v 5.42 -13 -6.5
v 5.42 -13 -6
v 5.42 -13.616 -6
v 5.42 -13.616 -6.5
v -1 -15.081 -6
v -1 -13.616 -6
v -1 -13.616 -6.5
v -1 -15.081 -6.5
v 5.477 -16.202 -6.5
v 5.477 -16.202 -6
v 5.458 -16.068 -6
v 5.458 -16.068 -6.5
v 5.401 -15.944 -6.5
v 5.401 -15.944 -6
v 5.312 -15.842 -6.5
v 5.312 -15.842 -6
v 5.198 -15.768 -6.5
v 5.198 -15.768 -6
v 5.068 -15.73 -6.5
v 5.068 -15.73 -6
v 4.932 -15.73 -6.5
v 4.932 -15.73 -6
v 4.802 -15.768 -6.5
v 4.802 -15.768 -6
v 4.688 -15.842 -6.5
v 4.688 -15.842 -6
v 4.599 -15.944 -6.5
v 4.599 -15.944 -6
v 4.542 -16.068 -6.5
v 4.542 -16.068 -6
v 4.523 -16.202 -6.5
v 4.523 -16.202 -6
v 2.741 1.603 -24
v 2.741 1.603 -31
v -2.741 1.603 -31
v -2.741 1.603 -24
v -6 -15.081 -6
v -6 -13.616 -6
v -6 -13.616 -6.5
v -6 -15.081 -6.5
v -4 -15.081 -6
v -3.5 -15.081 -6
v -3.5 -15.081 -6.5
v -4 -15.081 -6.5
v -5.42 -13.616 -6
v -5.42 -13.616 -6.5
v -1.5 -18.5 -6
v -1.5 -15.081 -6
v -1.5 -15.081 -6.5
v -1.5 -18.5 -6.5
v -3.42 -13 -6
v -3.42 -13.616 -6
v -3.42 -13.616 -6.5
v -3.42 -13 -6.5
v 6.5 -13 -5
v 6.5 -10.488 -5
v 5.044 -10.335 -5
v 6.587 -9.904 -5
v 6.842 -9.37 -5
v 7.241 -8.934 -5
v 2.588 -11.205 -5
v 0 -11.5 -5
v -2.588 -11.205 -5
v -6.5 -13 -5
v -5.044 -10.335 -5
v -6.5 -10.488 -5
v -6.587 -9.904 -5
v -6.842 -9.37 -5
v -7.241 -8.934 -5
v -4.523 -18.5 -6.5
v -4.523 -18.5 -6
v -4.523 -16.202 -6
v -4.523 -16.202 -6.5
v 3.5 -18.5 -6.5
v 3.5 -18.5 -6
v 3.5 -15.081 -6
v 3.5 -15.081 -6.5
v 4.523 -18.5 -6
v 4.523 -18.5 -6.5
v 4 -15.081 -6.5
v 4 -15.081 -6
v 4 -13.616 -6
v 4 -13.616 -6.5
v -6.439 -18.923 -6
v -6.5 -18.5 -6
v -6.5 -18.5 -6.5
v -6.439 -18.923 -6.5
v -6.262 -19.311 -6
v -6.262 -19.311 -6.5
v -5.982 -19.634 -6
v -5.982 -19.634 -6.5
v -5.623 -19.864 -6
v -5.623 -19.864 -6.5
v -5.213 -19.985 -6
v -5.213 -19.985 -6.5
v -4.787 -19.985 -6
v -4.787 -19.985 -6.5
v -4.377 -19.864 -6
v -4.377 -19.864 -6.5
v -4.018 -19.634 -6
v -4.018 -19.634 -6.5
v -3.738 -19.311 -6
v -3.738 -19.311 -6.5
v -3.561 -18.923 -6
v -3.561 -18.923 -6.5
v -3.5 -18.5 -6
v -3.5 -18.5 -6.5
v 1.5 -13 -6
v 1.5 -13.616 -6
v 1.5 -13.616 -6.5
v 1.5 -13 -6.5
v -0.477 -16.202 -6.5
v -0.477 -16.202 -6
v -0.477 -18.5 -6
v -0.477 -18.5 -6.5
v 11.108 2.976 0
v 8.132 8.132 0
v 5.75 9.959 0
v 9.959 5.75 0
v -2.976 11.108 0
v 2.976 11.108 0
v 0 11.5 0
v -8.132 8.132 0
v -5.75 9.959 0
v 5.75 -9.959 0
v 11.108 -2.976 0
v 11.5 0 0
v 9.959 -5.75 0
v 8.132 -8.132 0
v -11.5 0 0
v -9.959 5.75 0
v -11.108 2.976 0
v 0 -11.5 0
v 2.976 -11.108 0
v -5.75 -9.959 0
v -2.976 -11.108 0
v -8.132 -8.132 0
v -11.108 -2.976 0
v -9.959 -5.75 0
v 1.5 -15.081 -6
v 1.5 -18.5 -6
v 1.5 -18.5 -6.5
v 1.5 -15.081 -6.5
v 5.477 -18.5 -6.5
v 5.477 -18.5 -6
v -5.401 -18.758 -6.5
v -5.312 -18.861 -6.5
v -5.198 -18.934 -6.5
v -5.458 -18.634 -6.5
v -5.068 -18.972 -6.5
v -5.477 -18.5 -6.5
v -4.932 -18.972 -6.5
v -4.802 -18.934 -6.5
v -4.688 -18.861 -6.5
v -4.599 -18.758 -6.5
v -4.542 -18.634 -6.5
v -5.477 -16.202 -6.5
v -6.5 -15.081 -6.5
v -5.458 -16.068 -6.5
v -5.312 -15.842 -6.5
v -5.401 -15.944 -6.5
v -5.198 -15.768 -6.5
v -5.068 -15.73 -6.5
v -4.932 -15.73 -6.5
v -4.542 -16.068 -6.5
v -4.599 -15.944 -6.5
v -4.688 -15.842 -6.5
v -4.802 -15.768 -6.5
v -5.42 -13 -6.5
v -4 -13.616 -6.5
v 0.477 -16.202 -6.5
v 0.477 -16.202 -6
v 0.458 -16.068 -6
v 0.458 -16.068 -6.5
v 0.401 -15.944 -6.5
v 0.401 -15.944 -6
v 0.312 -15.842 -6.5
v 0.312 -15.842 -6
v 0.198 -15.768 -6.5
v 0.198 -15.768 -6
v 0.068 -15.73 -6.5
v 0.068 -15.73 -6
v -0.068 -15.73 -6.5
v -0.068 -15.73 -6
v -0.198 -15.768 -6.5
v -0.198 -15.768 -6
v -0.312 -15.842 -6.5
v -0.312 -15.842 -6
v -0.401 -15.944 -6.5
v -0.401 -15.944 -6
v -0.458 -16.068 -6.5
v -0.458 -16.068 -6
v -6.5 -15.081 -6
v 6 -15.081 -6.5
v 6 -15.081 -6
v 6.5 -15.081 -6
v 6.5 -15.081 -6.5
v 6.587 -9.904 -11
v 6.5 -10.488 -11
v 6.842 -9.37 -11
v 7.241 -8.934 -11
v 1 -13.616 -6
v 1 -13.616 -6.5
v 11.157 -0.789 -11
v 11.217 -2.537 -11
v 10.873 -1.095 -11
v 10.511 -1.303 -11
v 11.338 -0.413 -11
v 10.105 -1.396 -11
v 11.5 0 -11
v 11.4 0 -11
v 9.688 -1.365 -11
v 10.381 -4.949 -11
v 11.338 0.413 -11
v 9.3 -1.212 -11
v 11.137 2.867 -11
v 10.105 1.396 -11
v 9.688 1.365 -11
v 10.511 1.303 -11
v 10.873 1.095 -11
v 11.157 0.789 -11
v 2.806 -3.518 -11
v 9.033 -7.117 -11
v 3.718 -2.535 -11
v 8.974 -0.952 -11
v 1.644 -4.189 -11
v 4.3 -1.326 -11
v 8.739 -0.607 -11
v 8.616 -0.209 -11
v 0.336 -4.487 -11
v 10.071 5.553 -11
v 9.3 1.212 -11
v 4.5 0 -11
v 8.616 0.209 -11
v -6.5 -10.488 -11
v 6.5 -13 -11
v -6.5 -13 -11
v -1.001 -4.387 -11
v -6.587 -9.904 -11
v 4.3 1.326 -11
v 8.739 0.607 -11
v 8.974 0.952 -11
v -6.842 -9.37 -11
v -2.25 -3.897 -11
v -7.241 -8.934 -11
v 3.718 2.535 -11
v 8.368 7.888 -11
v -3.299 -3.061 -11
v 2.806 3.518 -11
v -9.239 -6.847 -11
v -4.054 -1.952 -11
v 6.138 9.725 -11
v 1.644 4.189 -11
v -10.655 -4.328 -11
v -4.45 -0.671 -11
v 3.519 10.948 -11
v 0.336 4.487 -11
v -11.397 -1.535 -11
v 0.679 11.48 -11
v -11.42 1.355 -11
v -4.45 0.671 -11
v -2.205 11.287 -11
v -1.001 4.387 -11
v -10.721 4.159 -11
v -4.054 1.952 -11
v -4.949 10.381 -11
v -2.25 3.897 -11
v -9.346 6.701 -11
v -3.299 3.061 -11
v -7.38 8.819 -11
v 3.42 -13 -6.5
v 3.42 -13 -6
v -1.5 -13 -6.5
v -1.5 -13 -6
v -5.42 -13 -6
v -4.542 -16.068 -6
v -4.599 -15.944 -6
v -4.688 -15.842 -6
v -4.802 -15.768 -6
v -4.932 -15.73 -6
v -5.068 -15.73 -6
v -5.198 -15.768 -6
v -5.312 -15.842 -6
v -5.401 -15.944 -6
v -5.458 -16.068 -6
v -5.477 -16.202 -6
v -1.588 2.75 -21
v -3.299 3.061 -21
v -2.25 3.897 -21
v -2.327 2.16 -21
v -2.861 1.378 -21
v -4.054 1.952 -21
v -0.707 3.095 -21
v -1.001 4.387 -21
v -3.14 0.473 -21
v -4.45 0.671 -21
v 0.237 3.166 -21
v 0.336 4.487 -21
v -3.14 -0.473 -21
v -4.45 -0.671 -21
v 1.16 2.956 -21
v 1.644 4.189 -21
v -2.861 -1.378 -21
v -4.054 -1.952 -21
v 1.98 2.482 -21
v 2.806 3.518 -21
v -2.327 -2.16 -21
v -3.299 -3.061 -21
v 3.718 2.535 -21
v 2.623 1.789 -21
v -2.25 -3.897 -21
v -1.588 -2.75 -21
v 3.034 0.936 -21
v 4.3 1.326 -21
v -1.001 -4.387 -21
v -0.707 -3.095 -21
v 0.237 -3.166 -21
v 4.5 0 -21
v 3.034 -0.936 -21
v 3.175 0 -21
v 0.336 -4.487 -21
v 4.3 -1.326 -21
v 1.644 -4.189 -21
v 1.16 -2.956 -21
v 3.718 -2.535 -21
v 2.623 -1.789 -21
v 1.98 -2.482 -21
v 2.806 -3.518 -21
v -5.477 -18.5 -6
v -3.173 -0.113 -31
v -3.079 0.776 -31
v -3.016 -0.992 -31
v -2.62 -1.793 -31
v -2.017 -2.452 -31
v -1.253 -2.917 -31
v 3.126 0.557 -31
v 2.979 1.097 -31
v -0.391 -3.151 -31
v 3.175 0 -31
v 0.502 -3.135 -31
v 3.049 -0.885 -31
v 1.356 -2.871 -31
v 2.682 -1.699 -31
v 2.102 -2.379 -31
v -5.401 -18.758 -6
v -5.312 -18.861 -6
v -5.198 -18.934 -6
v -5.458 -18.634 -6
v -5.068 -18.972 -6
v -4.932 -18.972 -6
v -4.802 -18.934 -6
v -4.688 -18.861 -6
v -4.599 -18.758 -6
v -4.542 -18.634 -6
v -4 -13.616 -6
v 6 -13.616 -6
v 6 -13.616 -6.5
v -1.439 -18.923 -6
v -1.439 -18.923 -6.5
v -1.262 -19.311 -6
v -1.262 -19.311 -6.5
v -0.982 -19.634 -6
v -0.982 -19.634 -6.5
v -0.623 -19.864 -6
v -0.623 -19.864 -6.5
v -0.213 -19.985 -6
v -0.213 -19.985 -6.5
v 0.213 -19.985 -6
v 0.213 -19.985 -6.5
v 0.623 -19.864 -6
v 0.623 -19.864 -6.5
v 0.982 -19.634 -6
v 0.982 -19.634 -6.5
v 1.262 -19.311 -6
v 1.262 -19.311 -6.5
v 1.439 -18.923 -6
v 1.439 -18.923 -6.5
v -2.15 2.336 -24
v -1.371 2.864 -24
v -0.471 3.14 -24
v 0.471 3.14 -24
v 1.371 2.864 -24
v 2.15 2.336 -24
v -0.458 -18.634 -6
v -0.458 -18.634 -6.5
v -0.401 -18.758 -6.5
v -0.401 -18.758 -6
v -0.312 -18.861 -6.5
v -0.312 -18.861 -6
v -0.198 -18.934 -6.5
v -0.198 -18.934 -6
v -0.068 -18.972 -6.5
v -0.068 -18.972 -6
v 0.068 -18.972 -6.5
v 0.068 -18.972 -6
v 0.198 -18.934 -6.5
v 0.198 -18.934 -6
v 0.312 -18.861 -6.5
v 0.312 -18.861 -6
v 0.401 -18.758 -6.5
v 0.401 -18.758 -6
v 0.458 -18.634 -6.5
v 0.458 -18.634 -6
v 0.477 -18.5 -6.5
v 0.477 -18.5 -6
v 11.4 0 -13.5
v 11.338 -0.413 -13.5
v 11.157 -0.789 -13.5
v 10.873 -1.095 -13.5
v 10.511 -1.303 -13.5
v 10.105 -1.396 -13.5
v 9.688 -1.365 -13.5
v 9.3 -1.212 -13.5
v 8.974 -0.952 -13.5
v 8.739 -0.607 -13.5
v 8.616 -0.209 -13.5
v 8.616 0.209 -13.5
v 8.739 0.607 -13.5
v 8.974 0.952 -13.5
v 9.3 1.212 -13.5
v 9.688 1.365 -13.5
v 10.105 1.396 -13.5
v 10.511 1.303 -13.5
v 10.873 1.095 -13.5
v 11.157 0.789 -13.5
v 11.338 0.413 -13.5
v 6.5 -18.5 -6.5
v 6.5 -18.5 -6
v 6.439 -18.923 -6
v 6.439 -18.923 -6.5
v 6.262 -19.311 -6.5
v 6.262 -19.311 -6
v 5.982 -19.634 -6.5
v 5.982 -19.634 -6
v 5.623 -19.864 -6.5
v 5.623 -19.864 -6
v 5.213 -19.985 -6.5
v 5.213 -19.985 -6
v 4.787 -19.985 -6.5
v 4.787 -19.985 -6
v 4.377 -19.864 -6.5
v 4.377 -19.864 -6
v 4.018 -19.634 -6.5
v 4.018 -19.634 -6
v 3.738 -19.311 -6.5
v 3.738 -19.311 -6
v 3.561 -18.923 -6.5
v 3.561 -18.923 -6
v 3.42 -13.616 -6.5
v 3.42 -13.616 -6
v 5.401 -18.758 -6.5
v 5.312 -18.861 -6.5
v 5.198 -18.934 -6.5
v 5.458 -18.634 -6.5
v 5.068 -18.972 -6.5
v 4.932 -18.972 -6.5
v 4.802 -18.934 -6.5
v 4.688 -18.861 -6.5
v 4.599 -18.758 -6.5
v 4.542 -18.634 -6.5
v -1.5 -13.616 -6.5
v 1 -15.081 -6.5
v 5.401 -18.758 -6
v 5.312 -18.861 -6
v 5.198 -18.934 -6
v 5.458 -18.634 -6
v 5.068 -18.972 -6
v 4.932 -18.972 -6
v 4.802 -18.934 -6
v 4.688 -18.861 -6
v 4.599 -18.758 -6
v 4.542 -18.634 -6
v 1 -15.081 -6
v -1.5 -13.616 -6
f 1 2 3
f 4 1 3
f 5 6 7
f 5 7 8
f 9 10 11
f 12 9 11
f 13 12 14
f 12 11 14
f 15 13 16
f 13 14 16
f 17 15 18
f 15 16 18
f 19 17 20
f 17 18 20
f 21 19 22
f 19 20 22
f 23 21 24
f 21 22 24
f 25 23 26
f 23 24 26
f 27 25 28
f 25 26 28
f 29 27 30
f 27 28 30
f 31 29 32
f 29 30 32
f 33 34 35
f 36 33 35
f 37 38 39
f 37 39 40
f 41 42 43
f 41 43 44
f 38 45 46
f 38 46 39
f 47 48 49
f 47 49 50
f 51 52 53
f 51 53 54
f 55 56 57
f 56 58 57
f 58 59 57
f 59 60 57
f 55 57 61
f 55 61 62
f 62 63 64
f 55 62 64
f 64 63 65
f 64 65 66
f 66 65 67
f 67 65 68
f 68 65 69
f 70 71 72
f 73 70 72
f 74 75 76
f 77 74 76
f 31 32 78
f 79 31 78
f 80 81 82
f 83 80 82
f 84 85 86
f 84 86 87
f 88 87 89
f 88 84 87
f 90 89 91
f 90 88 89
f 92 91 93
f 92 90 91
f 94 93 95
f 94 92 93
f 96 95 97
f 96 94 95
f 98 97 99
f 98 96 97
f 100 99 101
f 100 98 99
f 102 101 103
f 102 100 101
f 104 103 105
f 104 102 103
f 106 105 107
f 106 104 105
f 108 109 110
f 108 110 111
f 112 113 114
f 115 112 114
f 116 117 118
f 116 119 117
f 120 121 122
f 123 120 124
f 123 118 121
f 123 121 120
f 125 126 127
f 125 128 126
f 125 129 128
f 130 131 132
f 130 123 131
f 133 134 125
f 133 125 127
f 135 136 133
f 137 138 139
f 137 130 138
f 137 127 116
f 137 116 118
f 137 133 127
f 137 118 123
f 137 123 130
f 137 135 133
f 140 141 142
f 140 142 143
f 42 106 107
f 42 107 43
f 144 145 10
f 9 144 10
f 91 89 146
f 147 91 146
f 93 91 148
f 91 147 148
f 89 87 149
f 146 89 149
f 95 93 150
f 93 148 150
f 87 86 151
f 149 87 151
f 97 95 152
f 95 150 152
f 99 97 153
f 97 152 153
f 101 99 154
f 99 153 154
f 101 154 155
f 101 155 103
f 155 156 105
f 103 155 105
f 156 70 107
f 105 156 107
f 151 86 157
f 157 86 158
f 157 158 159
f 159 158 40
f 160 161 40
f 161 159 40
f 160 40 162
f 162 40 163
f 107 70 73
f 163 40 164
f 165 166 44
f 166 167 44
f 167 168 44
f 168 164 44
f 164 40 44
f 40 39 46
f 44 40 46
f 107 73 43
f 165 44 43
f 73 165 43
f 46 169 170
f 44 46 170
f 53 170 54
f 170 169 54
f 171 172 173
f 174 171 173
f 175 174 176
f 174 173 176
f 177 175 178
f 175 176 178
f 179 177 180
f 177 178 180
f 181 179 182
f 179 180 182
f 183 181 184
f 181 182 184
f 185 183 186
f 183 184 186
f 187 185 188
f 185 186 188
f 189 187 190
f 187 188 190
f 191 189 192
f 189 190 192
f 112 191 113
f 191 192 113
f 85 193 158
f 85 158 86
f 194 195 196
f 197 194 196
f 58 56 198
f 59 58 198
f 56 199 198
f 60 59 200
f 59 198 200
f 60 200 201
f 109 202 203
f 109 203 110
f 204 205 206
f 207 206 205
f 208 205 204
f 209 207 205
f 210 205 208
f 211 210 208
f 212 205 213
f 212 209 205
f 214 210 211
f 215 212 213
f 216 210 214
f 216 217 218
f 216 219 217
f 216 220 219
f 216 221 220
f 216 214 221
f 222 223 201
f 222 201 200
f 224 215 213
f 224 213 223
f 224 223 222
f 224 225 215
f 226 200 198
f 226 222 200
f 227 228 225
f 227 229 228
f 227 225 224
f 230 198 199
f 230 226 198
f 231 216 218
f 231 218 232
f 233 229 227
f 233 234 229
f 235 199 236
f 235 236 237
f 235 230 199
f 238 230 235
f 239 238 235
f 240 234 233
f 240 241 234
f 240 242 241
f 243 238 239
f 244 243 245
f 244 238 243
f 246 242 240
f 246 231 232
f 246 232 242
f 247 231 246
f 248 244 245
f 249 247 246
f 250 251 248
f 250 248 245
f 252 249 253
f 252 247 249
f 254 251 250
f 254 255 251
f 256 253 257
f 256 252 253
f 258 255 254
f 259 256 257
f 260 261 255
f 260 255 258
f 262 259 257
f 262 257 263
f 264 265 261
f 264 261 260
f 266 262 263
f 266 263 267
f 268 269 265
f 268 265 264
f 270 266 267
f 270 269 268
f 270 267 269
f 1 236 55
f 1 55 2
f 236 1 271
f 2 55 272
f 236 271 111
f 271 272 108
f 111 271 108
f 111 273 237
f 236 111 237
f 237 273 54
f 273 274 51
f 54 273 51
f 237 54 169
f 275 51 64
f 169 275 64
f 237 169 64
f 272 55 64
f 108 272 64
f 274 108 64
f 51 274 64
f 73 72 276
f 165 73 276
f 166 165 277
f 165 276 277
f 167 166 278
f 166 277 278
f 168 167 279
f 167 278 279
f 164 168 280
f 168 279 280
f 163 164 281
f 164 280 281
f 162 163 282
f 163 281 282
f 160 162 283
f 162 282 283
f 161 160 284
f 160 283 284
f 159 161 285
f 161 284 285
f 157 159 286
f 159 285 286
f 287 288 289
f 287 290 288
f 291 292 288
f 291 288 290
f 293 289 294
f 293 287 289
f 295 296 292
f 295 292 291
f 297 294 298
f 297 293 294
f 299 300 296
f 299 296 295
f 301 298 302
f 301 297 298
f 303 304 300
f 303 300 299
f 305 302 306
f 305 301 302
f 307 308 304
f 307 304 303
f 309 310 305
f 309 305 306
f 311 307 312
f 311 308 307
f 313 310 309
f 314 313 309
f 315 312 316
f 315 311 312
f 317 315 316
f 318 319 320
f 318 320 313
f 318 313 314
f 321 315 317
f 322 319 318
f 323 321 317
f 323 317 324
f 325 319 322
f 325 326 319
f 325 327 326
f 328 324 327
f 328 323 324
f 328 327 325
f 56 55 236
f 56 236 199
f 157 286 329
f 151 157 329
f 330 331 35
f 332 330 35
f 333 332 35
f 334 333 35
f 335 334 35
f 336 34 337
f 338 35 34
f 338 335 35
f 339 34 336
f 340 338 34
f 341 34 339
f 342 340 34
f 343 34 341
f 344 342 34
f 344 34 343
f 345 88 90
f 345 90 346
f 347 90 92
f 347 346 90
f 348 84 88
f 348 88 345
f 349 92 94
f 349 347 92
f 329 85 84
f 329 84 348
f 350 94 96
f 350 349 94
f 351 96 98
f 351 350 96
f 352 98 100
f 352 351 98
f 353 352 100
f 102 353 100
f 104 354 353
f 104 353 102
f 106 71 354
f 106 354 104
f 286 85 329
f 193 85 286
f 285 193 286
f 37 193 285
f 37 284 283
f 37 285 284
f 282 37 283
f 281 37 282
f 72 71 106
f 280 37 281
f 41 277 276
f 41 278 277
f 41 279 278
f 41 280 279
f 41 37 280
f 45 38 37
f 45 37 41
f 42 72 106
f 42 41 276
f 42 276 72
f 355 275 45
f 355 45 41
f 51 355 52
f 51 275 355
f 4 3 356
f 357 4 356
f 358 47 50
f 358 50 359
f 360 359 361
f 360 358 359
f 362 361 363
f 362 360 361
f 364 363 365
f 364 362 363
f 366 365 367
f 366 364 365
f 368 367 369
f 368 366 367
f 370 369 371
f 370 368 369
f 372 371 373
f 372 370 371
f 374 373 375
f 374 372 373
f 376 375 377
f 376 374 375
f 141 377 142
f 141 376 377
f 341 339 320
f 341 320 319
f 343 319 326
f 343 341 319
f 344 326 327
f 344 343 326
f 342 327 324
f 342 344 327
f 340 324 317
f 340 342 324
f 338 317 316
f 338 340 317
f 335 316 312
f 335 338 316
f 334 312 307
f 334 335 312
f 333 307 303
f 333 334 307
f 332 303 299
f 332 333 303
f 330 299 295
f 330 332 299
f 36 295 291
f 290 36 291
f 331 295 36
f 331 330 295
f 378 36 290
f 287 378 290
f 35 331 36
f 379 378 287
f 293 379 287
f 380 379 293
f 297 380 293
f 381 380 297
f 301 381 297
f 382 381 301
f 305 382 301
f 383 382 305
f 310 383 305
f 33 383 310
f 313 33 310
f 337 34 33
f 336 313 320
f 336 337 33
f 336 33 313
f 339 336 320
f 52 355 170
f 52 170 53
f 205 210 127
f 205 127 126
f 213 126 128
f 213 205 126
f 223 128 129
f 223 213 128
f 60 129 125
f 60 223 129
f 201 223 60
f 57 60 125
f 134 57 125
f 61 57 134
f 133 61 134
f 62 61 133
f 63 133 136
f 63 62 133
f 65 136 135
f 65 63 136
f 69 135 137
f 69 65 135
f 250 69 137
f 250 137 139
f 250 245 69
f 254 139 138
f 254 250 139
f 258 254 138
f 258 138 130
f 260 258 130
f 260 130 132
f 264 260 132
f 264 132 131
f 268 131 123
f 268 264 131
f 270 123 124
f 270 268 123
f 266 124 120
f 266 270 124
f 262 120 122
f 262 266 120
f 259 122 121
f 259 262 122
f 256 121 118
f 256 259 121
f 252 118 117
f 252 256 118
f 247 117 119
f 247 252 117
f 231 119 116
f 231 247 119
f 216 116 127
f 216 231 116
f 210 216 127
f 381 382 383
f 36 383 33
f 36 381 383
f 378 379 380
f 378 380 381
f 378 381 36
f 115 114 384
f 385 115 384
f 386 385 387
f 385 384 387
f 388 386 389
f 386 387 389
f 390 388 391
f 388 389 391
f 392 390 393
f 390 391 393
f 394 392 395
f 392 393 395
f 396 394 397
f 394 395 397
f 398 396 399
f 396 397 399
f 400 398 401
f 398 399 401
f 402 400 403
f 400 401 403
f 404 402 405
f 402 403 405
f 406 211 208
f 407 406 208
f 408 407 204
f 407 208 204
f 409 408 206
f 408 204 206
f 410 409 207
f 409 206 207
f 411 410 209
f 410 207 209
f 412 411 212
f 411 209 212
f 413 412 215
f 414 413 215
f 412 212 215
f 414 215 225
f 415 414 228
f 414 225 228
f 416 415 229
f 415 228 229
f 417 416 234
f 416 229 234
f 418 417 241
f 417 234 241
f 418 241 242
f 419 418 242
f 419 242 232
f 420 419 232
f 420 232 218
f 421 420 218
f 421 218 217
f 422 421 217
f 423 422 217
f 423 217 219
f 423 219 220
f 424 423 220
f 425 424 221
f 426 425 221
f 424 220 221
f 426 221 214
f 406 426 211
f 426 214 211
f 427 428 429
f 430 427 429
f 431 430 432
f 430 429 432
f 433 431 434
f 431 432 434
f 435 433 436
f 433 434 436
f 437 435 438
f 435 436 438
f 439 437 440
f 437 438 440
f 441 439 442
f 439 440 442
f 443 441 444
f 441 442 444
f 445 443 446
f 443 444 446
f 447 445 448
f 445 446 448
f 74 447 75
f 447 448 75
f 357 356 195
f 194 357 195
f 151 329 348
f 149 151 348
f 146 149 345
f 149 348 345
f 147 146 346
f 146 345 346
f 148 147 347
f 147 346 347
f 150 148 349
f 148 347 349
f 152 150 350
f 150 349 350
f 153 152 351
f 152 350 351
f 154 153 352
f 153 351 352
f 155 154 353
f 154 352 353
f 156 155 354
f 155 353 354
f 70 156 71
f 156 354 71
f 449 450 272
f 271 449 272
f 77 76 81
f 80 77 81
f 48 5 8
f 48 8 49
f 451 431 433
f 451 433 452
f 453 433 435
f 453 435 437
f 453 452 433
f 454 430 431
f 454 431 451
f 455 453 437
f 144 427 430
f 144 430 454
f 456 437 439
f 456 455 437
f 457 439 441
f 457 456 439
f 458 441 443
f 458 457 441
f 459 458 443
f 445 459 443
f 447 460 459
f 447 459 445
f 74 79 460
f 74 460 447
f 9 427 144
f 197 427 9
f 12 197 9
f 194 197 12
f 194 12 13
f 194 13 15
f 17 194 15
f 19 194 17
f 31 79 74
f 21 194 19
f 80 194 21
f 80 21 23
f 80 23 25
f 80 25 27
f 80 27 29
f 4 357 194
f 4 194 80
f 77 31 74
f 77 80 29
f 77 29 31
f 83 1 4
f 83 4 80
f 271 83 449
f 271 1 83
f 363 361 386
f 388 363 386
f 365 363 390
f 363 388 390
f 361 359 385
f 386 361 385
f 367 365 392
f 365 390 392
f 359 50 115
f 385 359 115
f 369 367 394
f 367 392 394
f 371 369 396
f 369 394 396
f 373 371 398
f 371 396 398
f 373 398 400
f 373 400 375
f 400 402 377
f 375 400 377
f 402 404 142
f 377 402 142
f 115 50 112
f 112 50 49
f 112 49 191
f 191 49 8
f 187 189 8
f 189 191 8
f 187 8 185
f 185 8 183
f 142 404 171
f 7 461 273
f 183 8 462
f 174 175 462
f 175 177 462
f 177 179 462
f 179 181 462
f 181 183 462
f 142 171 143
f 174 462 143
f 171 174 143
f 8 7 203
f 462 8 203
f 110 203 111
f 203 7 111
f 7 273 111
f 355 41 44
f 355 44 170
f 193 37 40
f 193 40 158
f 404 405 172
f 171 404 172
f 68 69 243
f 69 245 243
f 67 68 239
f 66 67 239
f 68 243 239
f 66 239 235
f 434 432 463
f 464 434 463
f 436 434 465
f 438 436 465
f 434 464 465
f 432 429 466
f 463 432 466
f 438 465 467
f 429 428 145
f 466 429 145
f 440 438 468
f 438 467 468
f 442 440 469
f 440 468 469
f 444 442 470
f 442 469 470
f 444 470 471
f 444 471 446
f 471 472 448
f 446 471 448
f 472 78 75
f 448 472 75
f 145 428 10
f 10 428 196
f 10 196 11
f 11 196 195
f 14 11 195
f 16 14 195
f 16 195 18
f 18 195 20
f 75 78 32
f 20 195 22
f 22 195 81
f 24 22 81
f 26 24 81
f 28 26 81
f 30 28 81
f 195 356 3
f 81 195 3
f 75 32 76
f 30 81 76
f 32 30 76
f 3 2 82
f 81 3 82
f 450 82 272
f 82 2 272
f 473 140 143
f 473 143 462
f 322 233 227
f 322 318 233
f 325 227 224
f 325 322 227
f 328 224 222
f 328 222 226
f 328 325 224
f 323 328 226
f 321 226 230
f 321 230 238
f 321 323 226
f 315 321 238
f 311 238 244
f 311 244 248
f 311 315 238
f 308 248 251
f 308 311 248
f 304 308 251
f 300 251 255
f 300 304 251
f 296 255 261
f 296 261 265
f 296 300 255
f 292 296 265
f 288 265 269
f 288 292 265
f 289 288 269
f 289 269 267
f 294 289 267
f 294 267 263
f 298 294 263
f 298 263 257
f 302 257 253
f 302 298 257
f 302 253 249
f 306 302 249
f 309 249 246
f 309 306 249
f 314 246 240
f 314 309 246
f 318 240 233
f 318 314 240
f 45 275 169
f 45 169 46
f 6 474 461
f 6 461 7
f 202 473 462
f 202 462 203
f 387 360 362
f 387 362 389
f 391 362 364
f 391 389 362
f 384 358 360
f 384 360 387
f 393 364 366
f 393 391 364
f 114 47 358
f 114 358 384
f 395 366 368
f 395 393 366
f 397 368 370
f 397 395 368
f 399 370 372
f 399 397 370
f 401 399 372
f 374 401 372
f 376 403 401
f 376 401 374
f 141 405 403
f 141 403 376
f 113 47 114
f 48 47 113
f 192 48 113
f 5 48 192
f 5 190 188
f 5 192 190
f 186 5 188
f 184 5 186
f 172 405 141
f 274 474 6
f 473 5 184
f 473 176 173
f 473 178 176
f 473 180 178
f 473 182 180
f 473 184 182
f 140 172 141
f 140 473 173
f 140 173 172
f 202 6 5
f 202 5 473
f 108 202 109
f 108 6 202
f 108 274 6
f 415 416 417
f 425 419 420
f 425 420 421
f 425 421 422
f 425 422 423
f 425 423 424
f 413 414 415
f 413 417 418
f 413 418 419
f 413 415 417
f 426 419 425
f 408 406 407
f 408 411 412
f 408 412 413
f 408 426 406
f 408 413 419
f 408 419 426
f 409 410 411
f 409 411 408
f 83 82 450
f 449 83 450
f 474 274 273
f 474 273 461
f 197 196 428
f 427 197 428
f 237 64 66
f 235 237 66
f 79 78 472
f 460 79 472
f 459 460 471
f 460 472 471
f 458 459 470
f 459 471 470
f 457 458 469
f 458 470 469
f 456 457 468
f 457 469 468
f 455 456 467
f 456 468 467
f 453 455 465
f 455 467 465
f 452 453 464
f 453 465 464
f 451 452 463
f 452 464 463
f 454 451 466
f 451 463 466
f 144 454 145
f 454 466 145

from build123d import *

# Parameters (mm, degrees)
SKETCH2_R           = 1.4
BOSS_EXTRUDE1_DEPTH = 2.5
SKETCH3_W           = 13
SKETCH3_H           = 4.686630076
BOSS_EXTRUDE3_DEPTH = 6
FILLET1_R           = 2
BOSS_EXTRUDE4_DEPTH = 0.5
CUT_EXTRUDE1_DEPTH  = 7


with BuildPart() as part:
    # Sketch1 → Revolve1 (revolve)
    with BuildSketch(Plane(origin=(0, 0, 0), x_dir=(0, 0, -1), z_dir=(1, 0, 0)), mode=Mode.PRIVATE) as revolve1_sk:
        Polygon((0, 0), (0, 11.5), (11, 11.5), (11, 4.5), (21, 4.5), (21, 3.175), (31, 3.175), (31, 0), align=None)
    revolve(revolve1_sk.sketch.rotate(Axis((0, 0, 0), (0, 0, -1)), 90), axis=Axis((0, 0, 0), (0, 0, -1)))

    # Sketch2 → Boss-Extrude1 (add)
    with BuildSketch(Plane(origin=(0, 0, -11), x_dir=(-1, 0, 0), z_dir=(0, 0, -1))):
        with Locations(Location((-10, 0, 0), (0, 0, 180))):
            Circle(SKETCH2_R)
    extrude(amount=BOSS_EXTRUDE1_DEPTH)

    # Sketch3 → Boss-Extrude3 (add)
    with BuildSketch(Plane(origin=(0, 0, -5), x_dir=(-1, 0, 0), z_dir=(0, 0, -1))):
        with Locations((0, -10.656684962)):
            Rectangle(SKETCH3_W, SKETCH3_H)
    extrude(amount=BOSS_EXTRUDE3_DEPTH)

    # Fillet1
    fillet1_edges = [part.edges().sort_by_distance(p)[0] for p in [
        (6.5, -9.486832981, -8),
        (-6.5, -9.486832981, -8),
    ]]
    fillet(fillet1_edges, radius=FILLET1_R)

    # Sketch4 → Boss-Extrude4 (add)
    # profile 1 of 3: a face of its own
    with BuildSketch(Plane(origin=(0, 0, -6), x_dir=(-1, 0, 0), z_dir=(0, 0, -1))):
        with BuildLine():
            Line((-5.420458078, -13), (-5.420458078, -13.616327338))
            Line((-5.420458078, -13.616327338), (-6, -13.616327338))
            Line((-6, -13.616327338), (-6, -15.080506085))
            Line((-6, -15.080506085), (-6.5, -15.080506085))
            Line((-6.5, -15.080506085), (-6.5, -18.5))
            ThreePointArc((-6.5, -18.5), (-5, -20), (-3.5, -18.5))
            Line((-3.5, -18.5), (-3.5, -15.080506085))
            Line((-3.5, -15.080506085), (-4, -15.080506085))
            Line((-4, -15.080506085), (-4, -13.616327338))
            Line((-4, -13.616327338), (-3.420458078, -13.616327338))
            Line((-3.420458078, -13.616327338), (-3.420458078, -13))
            Line((-3.420458078, -13), (-5.420458078, -13))
        make_face()
        with BuildLine():
            Line((-5.477176785, -18.5), (-5.477176785, -16.20237717))
            ThreePointArc((-5.477176785, -16.20237717), (-5, -15.725200384), (-4.522823215, -16.20237717))
            Line((-4.522823215, -16.20237717), (-4.522823215, -18.5))
            ThreePointArc((-4.522823215, -18.5), (-5, -18.977176785), (-5.477176785, -18.5))
        make_face(mode=Mode.SUBTRACT)
    # profile 2 of 3: a face of its own
    with BuildSketch(Plane(origin=(0, 0, -6), x_dir=(-1, 0, 0), z_dir=(0, 0, -1))):
        with BuildLine():
            Line((-1.5, -18.5), (-1.5, -15.080506085))
            Line((-1.5, -15.080506085), (-1, -15.080506085))
            Line((-1, -15.080506085), (-1, -13.616327338))
            Line((-1, -13.616327338), (-1.5, -13.616327338))
            Line((-1.5, -13.616327338), (-1.5, -13))
            Line((-1.5, -13), (1.5, -13))
            Line((1.5, -13), (1.5, -13.616327338))
            Line((1.5, -13.616327338), (1, -13.616327338))
            Line((1, -13.616327338), (1, -15.080506085))
            Line((1, -15.080506085), (1.5, -15.080506085))
            Line((1.5, -15.080506085), (1.5, -18.5))
            ThreePointArc((1.5, -18.5), (0, -20), (-1.5, -18.5))
        make_face()
        with BuildLine():
            Line((-0.477176785, -18.5), (-0.477176785, -16.20237717))
            ThreePointArc((-0.477176785, -16.20237717), (0, -15.725200384), (0.477176785, -16.20237717))
            Line((0.477176785, -16.20237717), (0.477176785, -18.5))
            ThreePointArc((0.477176785, -18.5), (0, -18.977176785), (-0.477176785, -18.5))
        make_face(mode=Mode.SUBTRACT)
    # profile 3 of 3: a face of its own
    with BuildSketch(Plane(origin=(0, 0, -6), x_dir=(-1, 0, 0), z_dir=(0, 0, -1))):
        with BuildLine():
            Line((3.420458078, -13.616327338), (3.420458078, -13))
            Line((3.420458078, -13), (5.420458078, -13))
            Line((5.420458078, -13), (5.420458078, -13.616327338))
            Line((5.420458078, -13.616327338), (6, -13.616327338))
            Line((6, -13.616327338), (6, -15.080506085))
            Line((6, -15.080506085), (6.5, -15.080506085))
            Line((6.5, -15.080506085), (6.5, -18.5))
            ThreePointArc((6.5, -18.5), (5, -20), (3.5, -18.5))
            Line((3.5, -18.5), (3.5, -15.080506085))
            Line((3.5, -15.080506085), (4, -15.080506085))
            Line((4, -15.080506085), (4, -13.616327338))
            Line((4, -13.616327338), (3.420458078, -13.616327338))
        make_face()
        with BuildLine():
            Line((4.522823215, -18.5), (4.522823215, -16.20237717))
            ThreePointArc((4.522823215, -16.20237717), (5, -15.725200384), (5.477176785, -16.20237717))
            Line((5.477176785, -16.20237717), (5.477176785, -18.5))
            ThreePointArc((5.477176785, -18.5), (5, -18.977176785), (4.522823215, -18.5))
        make_face(mode=Mode.SUBTRACT)
    extrude(amount=BOSS_EXTRUDE4_DEPTH)

    # Sketch5 → Cut-Extrude1 (cut)
    with BuildSketch(Plane(origin=(0, 0, -31), x_dir=(-1, 0, 0), z_dir=(0, 0, -1))):
        with BuildLine():
            Line((-2.740543661, 1.603136127), (2.740543661, 1.603136127))
            ThreePointArc((2.740543661, 1.603136127), (0, 3.175), (-2.740543661, 1.603136127))
        make_face()
    extrude(amount=-CUT_EXTRUDE1_DEPTH, mode=Mode.SUBTRACT)


solid = part.part
